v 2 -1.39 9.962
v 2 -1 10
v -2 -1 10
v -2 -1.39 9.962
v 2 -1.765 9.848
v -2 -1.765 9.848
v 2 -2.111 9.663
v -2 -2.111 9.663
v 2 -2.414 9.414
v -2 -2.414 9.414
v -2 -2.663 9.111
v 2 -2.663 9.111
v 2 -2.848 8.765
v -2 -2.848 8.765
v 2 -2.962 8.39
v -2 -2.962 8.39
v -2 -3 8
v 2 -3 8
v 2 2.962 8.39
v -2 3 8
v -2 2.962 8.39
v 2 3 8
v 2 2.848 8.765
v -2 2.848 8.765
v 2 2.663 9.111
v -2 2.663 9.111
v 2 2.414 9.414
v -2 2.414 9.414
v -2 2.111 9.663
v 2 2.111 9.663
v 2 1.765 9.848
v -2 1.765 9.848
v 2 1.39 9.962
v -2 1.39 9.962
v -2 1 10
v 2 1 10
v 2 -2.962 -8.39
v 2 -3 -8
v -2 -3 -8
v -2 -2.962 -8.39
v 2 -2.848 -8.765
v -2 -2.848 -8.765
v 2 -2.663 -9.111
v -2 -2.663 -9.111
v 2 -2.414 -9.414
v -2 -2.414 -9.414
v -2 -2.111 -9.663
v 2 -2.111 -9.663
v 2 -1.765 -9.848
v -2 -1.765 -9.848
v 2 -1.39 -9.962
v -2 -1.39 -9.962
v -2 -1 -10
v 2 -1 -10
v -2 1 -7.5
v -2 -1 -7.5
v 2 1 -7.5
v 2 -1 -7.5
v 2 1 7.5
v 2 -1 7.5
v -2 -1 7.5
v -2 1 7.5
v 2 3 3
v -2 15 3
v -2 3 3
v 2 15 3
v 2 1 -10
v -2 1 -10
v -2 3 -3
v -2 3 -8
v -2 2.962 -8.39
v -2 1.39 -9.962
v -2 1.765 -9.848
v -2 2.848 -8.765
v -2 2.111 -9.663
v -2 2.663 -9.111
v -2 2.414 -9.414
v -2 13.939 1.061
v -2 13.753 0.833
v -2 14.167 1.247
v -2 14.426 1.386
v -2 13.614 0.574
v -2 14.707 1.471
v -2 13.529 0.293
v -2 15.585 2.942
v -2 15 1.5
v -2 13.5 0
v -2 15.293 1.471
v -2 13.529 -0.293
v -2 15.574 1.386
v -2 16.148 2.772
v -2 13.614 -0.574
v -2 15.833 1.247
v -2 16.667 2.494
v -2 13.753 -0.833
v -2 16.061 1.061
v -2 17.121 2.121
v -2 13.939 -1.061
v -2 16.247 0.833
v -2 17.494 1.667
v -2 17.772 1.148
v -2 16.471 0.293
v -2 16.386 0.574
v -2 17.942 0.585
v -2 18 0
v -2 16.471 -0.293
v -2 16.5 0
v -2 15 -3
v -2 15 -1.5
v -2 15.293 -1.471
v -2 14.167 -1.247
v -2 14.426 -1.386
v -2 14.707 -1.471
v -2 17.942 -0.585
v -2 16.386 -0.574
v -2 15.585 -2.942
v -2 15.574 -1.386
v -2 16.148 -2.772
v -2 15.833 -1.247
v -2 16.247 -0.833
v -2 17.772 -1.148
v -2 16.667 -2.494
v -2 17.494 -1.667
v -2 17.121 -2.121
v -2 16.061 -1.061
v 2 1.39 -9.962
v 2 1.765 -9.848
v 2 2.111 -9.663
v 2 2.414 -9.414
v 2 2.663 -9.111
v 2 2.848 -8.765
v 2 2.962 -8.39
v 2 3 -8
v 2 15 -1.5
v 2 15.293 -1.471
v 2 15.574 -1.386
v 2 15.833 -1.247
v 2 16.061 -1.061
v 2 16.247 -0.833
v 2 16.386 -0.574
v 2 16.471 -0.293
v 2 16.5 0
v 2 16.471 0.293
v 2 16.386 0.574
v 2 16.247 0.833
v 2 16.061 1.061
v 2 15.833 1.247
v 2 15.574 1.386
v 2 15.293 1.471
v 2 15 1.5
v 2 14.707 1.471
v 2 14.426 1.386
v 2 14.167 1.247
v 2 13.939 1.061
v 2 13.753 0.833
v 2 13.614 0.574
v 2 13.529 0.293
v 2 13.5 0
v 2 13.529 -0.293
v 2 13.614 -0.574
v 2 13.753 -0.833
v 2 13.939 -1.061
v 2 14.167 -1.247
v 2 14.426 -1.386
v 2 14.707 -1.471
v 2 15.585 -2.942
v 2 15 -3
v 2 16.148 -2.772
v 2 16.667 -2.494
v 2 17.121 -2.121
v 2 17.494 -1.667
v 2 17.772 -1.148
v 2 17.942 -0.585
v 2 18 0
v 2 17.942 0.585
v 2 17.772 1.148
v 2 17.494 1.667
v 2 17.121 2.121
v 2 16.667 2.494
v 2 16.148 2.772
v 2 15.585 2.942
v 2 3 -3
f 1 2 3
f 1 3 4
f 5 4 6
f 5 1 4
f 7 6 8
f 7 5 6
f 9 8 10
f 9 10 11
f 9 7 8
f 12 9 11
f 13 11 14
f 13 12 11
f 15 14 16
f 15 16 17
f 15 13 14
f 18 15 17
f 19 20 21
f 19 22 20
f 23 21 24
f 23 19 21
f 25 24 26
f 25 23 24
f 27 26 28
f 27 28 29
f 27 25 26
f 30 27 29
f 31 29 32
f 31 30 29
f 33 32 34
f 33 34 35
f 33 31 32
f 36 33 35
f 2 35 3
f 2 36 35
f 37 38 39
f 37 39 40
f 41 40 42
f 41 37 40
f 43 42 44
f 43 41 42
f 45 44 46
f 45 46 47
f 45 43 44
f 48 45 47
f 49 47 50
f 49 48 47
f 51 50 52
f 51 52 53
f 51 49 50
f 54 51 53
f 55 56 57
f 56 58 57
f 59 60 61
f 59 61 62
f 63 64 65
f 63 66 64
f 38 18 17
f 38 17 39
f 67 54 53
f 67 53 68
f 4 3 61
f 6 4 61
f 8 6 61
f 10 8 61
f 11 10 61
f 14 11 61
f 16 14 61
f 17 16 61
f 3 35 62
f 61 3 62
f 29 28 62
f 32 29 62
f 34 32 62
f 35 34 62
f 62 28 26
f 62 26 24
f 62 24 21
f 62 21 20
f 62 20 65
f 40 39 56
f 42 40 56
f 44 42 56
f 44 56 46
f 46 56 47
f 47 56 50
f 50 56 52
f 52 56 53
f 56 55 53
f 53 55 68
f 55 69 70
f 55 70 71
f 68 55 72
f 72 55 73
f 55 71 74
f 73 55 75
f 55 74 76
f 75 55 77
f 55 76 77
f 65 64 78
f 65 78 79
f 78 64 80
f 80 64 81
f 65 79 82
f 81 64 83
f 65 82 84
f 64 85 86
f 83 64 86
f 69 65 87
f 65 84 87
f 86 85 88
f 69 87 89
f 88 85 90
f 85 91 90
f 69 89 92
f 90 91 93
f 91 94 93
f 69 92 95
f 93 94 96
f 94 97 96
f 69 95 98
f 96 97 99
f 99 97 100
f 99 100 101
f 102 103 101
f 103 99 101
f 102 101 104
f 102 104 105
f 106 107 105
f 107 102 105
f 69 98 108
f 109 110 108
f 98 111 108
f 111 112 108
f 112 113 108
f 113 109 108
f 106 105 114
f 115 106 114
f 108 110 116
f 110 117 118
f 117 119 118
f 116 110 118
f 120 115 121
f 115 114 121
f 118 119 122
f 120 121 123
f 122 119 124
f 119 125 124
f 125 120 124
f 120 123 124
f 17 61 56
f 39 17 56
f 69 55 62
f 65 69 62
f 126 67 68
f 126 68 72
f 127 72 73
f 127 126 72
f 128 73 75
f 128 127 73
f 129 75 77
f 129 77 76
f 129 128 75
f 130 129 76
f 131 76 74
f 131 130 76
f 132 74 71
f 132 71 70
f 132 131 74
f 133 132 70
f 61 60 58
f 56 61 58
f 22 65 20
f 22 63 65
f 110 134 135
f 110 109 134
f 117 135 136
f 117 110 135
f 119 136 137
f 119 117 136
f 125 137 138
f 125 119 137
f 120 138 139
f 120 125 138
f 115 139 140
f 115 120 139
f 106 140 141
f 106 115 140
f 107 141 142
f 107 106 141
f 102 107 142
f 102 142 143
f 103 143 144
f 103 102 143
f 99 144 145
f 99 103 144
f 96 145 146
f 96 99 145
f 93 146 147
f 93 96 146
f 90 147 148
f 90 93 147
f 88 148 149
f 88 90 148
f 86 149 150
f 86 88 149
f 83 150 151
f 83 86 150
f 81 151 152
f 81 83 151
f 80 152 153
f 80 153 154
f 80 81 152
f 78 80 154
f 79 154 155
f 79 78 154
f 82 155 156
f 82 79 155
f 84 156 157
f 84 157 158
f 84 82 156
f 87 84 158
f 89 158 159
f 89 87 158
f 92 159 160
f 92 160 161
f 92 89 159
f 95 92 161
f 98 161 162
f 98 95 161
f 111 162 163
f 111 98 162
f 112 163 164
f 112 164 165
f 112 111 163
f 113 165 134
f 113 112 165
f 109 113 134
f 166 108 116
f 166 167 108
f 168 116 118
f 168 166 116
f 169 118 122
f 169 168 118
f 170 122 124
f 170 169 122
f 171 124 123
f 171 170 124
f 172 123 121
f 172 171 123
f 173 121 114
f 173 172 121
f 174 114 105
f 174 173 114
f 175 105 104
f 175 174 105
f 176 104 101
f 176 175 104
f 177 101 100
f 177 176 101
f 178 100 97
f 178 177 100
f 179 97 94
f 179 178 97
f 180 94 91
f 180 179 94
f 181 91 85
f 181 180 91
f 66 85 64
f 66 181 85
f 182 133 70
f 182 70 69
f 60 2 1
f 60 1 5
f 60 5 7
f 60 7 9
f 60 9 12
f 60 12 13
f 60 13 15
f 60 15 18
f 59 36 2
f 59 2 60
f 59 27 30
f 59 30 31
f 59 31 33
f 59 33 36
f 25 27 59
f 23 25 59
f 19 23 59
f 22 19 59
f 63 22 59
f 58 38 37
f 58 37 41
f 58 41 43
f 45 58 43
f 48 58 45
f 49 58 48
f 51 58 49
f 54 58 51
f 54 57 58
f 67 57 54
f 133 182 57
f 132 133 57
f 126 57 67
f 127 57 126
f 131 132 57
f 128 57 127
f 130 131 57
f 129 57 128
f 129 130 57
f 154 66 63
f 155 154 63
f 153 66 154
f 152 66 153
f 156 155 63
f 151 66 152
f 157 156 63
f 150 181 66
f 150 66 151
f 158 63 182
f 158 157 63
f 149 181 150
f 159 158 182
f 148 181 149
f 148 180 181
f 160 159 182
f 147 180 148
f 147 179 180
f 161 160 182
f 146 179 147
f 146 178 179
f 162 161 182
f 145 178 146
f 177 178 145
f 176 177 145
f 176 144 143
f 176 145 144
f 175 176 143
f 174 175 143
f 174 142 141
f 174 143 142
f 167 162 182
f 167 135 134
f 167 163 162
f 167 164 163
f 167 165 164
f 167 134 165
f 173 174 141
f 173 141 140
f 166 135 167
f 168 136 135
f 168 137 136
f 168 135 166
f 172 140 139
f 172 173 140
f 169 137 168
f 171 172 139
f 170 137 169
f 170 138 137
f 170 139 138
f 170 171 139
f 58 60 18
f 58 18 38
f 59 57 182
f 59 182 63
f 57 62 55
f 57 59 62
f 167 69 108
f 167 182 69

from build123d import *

# Parameters (mm, degrees)
CROQUIS1_R              = 1.5
CROQUIS1_W              = 15
CROQUIS1_H              = 2
SALIENTE_EXTRUIR1_DEPTH = 2


with BuildPart() as part:
    # Croquis1 → Saliente-Extruir1 (new, symmetric)
    with BuildSketch(Plane(origin=(0, 0, 0), x_dir=(0, 0, -1), z_dir=(1, 0, 0))):
        with BuildLine():
            Line((-10, 1), (-10, -1))
            ThreePointArc((-10, -1), (-9.414213562, -2.414213562), (-8, -3))
            Line((-8, -3), (8, -3))
            ThreePointArc((8, -3), (9.414213562, -2.414213562), (10, -1))
            Line((10, -1), (10, 1))
            ThreePointArc((10, 1), (9.414213562, 2.414213562), (8, 3))
            Line((8, 3), (3, 3))
            Line((3, 3), (3, 15))
            ThreePointArc((3, 15), (0, 18), (-3, 15))
            Line((-3, 15), (-3, 3))
            Line((-3, 3), (-8, 3))
            ThreePointArc((-8, 3), (-9.414213562, 2.414213562), (-10, 1))
        make_face()
        with Locations((0, 15)):
            Circle(CROQUIS1_R, mode=Mode.SUBTRACT)
        Rectangle(CROQUIS1_W, CROQUIS1_H, mode=Mode.SUBTRACT)
    extrude(amount=SALIENTE_EXTRUIR1_DEPTH, both=True)


solid = part.part
